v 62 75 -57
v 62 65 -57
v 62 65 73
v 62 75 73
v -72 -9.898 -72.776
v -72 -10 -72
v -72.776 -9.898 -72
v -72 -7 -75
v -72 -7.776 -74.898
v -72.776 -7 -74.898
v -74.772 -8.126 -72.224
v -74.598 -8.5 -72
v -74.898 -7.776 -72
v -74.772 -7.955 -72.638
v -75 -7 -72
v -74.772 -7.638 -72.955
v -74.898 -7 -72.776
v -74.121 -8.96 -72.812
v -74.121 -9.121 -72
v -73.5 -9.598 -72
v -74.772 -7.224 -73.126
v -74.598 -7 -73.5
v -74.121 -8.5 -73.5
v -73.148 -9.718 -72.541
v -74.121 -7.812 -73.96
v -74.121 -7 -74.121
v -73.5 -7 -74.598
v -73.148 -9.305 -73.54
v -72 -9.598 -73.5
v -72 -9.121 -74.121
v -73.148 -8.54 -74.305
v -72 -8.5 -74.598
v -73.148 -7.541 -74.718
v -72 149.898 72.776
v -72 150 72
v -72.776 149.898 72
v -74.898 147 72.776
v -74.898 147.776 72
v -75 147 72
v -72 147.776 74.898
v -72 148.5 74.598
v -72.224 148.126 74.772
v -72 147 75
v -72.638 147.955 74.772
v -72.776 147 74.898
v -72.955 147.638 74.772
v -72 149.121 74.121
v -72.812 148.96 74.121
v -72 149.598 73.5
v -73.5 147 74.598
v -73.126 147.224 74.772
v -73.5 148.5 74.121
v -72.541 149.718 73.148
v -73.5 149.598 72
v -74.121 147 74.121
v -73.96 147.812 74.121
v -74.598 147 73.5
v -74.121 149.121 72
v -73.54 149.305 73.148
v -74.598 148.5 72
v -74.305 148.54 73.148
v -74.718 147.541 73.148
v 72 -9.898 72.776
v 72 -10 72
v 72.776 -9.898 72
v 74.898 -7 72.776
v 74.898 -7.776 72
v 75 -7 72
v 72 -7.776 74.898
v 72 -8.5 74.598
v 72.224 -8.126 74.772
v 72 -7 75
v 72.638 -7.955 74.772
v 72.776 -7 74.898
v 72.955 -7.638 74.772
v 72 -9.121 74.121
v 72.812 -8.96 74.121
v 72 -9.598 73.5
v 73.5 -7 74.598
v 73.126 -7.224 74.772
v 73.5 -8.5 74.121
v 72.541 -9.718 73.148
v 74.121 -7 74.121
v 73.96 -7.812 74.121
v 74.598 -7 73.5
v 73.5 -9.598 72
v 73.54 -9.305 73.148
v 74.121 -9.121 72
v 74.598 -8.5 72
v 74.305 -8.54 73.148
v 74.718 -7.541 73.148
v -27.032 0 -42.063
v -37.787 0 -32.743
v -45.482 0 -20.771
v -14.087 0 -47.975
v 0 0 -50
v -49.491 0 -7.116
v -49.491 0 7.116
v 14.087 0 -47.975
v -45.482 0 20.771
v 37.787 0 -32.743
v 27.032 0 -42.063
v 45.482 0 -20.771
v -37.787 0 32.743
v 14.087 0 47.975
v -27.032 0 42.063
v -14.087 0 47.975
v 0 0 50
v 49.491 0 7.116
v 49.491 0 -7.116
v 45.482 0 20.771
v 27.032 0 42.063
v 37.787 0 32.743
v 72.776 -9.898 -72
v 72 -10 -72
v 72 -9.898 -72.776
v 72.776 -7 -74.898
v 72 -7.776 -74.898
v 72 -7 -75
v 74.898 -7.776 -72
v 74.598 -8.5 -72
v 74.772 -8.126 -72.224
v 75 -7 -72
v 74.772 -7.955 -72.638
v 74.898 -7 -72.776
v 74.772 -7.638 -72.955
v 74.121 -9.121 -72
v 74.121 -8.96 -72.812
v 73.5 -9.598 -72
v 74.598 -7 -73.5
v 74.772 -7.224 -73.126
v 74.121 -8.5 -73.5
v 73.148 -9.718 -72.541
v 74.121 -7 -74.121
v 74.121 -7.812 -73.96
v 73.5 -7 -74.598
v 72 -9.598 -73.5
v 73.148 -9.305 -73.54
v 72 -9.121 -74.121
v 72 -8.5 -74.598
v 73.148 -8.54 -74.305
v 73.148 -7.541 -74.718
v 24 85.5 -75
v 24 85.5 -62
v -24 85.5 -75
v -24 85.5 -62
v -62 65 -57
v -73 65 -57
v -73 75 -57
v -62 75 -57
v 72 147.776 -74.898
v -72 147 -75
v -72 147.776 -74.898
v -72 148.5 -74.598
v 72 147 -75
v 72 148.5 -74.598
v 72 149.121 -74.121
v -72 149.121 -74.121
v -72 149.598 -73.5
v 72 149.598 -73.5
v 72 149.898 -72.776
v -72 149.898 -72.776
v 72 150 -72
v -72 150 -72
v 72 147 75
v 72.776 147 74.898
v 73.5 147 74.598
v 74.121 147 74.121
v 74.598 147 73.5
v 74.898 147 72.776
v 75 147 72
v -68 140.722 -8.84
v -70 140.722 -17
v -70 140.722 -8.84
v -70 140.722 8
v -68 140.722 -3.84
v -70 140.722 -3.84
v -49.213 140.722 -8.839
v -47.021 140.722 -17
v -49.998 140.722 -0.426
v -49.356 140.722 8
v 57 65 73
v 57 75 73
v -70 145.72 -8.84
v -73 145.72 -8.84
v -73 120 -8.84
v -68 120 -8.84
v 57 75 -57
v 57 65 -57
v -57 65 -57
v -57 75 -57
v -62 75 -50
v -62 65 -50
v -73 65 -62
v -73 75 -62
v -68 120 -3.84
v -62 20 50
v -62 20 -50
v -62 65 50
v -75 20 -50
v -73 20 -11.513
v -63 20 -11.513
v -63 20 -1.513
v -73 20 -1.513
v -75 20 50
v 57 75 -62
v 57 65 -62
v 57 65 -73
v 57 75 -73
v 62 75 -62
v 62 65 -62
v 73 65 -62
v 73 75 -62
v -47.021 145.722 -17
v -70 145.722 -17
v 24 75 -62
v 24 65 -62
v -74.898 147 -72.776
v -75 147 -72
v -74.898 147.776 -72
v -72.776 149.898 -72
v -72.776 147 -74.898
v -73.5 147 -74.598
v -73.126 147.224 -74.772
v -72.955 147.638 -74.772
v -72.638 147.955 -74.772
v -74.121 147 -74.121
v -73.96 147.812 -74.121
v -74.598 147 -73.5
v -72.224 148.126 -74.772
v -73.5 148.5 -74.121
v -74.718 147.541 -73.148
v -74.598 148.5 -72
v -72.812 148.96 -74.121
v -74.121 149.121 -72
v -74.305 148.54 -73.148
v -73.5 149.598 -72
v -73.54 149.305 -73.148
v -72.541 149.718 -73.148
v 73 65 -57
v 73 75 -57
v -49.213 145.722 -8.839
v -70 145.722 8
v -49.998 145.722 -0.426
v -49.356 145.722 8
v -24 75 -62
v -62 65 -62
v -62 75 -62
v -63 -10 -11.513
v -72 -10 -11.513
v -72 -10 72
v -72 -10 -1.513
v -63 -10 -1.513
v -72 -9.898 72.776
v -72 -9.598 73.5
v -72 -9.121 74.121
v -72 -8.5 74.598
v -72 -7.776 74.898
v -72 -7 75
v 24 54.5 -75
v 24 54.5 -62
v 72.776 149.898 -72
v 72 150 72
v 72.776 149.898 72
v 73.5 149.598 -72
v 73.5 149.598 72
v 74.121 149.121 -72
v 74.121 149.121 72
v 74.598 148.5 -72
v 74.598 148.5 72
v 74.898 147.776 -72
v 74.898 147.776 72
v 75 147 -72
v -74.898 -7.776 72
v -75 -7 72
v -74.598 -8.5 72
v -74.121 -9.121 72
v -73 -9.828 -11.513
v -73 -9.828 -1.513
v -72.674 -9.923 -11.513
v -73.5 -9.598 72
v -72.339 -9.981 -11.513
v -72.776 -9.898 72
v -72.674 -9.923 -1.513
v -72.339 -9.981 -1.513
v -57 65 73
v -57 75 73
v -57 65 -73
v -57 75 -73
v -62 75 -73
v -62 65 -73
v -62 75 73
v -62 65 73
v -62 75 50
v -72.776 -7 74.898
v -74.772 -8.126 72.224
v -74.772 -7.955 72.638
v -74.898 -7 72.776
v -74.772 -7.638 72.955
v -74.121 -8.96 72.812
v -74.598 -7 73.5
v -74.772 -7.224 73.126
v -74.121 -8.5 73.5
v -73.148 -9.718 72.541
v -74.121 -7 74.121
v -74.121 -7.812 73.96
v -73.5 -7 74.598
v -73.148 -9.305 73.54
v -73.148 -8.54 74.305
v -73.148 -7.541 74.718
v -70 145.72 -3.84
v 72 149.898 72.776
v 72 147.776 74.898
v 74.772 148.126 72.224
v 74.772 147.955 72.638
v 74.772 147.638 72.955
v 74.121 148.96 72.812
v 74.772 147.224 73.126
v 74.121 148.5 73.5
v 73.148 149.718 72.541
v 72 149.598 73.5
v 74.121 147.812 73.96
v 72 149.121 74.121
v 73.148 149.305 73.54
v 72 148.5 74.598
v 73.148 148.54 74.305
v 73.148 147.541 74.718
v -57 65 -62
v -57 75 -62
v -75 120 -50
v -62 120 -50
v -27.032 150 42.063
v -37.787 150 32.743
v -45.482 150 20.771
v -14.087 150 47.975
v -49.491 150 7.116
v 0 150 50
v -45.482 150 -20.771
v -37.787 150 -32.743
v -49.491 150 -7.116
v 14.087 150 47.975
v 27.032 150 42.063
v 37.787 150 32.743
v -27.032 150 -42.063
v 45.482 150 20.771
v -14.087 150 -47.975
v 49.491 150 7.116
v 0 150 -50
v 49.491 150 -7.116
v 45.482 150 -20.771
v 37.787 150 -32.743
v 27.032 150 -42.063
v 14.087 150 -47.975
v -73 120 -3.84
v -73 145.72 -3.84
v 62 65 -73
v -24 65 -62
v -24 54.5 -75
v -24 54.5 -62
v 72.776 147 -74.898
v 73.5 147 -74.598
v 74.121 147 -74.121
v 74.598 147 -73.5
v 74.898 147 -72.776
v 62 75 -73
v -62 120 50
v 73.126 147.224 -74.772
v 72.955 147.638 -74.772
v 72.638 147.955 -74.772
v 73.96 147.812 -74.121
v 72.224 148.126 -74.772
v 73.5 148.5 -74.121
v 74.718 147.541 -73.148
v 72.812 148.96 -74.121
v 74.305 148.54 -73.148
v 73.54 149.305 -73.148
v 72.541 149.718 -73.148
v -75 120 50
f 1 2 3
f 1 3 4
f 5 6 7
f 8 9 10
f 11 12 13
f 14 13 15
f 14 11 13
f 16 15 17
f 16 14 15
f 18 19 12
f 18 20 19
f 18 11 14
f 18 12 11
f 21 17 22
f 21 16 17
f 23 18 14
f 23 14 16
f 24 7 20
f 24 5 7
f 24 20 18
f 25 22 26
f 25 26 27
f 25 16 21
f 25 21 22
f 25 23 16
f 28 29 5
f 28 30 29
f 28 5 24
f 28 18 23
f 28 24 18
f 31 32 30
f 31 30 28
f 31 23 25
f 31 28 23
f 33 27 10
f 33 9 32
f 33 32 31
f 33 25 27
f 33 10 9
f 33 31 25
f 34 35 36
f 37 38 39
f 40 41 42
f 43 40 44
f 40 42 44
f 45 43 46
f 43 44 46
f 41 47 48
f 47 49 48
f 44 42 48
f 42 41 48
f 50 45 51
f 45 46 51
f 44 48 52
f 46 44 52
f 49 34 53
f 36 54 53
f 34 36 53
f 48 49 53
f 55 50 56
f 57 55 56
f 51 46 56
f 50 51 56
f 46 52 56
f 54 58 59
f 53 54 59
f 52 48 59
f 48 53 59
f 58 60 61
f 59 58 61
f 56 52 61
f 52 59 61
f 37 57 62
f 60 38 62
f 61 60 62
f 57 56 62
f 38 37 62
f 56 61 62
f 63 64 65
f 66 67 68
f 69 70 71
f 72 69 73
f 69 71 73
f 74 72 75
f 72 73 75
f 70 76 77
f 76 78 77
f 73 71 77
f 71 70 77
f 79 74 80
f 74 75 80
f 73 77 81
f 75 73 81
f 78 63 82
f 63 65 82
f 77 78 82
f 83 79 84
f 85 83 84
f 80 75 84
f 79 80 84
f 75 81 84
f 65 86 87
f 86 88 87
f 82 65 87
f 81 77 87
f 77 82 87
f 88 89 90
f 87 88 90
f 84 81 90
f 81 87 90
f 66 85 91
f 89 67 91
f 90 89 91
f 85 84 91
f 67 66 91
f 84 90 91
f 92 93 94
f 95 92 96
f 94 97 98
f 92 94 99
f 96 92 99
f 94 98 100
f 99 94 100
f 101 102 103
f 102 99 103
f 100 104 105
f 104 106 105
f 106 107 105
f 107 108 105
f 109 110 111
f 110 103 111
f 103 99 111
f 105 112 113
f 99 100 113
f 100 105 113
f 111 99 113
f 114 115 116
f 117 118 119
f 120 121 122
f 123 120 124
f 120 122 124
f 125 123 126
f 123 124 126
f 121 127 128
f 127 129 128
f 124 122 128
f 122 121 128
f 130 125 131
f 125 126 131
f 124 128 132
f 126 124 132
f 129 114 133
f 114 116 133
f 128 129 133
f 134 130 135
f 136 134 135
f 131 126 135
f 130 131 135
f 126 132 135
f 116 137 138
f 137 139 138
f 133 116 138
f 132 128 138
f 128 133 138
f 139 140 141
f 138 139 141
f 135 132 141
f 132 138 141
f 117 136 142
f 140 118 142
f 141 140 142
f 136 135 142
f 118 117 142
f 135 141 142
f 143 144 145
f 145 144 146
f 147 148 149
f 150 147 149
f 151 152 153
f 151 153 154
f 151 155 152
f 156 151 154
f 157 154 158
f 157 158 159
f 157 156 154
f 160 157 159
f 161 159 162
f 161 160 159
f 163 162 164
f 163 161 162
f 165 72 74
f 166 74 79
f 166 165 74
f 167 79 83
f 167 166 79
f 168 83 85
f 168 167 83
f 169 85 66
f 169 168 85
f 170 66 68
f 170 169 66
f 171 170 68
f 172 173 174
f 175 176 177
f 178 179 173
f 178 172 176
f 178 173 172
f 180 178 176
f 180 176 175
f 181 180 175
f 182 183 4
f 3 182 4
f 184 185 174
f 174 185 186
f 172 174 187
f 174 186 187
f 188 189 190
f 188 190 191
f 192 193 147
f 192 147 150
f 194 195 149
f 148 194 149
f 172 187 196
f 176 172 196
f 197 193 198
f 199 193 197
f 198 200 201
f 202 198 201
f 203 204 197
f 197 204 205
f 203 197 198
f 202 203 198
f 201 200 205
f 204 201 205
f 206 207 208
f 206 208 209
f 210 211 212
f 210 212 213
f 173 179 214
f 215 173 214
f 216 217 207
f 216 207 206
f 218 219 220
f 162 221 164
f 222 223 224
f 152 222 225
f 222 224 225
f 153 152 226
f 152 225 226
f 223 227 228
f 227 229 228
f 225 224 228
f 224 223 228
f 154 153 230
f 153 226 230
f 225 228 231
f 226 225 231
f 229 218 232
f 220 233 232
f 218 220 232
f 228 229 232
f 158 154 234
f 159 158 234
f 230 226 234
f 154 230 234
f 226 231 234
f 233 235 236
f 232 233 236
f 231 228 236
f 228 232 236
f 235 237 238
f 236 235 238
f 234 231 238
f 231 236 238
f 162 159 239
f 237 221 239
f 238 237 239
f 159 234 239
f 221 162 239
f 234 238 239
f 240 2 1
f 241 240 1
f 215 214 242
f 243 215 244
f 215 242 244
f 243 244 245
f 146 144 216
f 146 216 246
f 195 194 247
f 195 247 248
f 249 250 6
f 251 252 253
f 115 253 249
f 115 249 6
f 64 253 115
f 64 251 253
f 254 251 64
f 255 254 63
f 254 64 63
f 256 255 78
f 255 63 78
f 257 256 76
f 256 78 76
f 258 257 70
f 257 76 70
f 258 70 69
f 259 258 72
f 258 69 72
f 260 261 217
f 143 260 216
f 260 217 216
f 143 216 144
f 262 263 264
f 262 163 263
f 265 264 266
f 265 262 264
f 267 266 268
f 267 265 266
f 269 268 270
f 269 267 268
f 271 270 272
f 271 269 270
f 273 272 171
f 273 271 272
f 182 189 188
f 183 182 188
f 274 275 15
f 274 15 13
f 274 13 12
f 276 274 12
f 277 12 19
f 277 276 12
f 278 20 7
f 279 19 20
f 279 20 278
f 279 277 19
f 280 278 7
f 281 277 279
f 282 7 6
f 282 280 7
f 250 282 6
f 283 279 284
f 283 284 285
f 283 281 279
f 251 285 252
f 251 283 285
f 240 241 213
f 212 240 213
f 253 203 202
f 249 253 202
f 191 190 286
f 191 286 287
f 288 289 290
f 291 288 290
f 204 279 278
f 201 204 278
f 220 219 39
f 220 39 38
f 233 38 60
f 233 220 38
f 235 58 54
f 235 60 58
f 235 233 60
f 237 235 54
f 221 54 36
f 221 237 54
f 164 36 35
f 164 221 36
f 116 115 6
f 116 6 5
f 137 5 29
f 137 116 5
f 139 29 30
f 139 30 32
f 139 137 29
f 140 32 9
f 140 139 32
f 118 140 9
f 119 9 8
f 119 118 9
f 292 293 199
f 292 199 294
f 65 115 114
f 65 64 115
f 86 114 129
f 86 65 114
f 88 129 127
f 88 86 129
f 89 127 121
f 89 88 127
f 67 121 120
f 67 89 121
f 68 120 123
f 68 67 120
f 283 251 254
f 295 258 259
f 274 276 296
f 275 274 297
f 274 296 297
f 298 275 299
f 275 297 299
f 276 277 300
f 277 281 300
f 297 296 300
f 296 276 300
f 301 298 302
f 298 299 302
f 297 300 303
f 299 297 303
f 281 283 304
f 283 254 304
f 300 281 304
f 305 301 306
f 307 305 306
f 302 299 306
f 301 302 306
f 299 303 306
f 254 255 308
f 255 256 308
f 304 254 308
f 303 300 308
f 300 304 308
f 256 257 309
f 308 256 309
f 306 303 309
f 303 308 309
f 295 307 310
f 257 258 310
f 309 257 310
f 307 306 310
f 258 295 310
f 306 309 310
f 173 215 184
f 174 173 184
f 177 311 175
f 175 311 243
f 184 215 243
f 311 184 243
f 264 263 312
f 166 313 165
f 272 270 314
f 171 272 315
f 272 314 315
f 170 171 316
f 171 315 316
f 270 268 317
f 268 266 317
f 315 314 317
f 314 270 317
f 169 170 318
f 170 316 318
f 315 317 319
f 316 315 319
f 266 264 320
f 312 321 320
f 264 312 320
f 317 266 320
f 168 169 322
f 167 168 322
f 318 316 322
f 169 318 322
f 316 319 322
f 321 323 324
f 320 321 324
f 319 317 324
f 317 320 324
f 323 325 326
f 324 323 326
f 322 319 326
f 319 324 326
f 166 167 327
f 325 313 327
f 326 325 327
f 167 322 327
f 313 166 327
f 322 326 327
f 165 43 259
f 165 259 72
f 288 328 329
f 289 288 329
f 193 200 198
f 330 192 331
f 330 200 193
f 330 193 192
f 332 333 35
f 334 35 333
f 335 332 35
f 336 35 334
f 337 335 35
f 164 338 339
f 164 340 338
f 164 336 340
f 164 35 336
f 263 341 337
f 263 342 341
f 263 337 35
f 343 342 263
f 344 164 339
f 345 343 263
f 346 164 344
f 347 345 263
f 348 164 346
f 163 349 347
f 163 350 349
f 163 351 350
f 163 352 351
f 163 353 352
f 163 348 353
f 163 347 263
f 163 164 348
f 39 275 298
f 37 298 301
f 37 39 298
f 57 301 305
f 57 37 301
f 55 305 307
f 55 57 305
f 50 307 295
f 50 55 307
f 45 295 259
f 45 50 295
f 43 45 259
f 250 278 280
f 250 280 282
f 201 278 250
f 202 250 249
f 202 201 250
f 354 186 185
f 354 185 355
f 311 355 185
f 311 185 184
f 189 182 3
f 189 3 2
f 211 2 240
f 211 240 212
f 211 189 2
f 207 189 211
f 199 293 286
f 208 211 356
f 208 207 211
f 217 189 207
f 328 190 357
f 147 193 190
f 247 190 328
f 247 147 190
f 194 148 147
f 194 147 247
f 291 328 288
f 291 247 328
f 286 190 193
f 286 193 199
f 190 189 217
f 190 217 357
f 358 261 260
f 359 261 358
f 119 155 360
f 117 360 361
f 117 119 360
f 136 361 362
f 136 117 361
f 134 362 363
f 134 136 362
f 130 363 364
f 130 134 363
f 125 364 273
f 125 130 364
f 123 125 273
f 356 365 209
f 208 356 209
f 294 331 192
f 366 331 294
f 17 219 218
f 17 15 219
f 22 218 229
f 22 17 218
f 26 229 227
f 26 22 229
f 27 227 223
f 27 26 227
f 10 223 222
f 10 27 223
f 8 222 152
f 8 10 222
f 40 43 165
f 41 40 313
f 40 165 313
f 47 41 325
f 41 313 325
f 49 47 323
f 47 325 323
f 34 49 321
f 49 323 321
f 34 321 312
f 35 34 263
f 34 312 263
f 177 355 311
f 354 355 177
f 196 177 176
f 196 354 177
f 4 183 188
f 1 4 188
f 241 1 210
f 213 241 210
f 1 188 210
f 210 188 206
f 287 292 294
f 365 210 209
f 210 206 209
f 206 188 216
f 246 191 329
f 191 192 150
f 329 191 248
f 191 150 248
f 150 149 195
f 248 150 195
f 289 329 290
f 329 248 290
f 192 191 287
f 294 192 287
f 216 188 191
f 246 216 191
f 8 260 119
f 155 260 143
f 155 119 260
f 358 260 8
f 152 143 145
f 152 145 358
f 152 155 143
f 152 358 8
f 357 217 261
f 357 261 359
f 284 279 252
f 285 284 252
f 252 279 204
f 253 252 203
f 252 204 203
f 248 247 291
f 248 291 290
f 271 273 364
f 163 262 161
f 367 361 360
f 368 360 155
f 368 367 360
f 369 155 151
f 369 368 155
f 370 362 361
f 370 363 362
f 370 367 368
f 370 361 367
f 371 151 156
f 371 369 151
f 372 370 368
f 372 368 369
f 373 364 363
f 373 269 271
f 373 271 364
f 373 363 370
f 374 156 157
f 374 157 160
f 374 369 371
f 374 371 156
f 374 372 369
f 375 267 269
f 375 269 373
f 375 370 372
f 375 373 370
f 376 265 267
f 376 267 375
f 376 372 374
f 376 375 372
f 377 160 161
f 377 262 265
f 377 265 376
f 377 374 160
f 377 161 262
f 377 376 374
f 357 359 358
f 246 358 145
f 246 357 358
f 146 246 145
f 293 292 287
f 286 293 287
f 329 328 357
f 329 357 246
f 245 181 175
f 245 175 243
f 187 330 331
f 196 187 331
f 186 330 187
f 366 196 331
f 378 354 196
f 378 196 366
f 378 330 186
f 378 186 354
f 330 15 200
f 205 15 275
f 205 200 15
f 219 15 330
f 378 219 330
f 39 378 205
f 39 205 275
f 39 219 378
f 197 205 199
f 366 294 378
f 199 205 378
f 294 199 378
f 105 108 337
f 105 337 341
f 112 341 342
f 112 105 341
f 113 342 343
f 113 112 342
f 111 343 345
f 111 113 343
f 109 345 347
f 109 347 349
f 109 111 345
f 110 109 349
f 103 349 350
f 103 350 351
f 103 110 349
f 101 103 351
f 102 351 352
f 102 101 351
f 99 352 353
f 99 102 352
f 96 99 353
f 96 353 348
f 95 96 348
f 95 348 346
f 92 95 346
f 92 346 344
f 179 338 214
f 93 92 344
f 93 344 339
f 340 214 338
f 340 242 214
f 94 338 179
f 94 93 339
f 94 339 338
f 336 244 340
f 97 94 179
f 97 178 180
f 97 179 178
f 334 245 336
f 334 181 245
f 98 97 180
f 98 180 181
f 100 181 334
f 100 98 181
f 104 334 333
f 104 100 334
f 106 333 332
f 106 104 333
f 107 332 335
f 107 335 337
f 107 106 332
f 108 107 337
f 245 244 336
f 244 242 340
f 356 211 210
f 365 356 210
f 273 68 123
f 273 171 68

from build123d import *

# Parameters (mm, degrees)
SKETCH6_W               = 150
SKETCH6_H               = 150
SKETCH6_R               = 50
BOSS_EXTRUDE4_DEPTH     = 150
SKETCH7_W               = 150
SKETCH7_H               = 150
BOSS_EXTRUDE5_DEPTH     = 10
SKETCH8_W               = 5
SKETCH8_H               = 10
CUT_EXTRUDE4_DEPTH      = 226
CUT_EXTRUDE5_DEPTH      = 226
CUT_EXTRUDE5_DEPTH_BACK = 226
SKETCH9_W               = 5
SKETCH9_H               = 10
CUT_EXTRUDE6_DEPTH      = 226
CUT_EXTRUDE6_DEPTH_BACK = 13
SKETCH10_W              = 48
SKETCH10_H              = 31
FILLET2_R               = 3
SKETCH18_W              = 100
SKETCH18_H              = 100
CUT_EXTRUDE10_DEPTH     = 13
SKETCH19_W              = 10
SKETCH19_H              = 10
CUT_EXTRUDE11_DEPTH     = 35
SKETCH21_W              = 5
SKETCH21_H              = 5
CUT_EXTRUDE12_DEPTH     = 25.72
SKETCH23_W              = 25
SKETCH23_H              = 5
CUT_EXTRUDE13_DEPTH     = 28
SKETCH24_W              = 5
SKETCH24_H              = 10
BOSS_EXTRUDE6_DEPTH     = 2
SKETCH27_W              = 5
SKETCH27_H              = 10
BOSS_EXTRUDE8_DEPTH     = 2
SKETCH31_W              = 5
SKETCH31_H              = 10
BOSS_EXTRUDE12_DEPTH    = 2
SKETCH32_W              = 5
SKETCH32_H              = 10
BOSS_EXTRUDE13_DEPTH    = 2


with BuildPart() as part:
    # Sketch6 → Boss-Extrude4 (new body)
    with BuildSketch(Plane(origin=(0, 0, 0), x_dir=(1, 0, 0), z_dir=(0, 1, 0))):
        Rectangle(SKETCH6_W, SKETCH6_H)
        with Locations(Location((0, 0, 0), (0, 0, 270))):
            Circle(SKETCH6_R, mode=Mode.SUBTRACT)
    extrude(amount=BOSS_EXTRUDE4_DEPTH)

    # Sketch7 → Boss-Extrude5 (add)
    with BuildSketch(Plane.XZ):
        Rectangle(SKETCH7_W, SKETCH7_H)
    extrude(amount=BOSS_EXTRUDE5_DEPTH)

    # Sketch8 → Cut-Extrude4 (cut, symmetric)
    with BuildSketch(Plane.XY.offset(75)):
        with Locations((59.5, 70)):
            Rectangle(SKETCH8_W, SKETCH8_H)
    cut_extrude4 = extrude(amount=CUT_EXTRUDE4_DEPTH, both=True, mode=Mode.SUBTRACT)

    # Mirror4: Cut-Extrude4 across plane
    add(cut_extrude4.mirror(Plane(origin=(0, 0, 0), x_dir=(0, 0, 1), z_dir=(1, 0, 0))), mode=Mode.SUBTRACT)

    # Sketch9 → Cut-Extrude5 (cut, two sides: drawn at the far end of the back side and taken through both)
    with BuildSketch(Plane(origin=(75, 0, 0), x_dir=(0, 0, -1), z_dir=(1, 0, 0)).offset(-CUT_EXTRUDE5_DEPTH_BACK)):
        with Locations((59.5, 70)):
            Rectangle(SKETCH9_W, SKETCH9_H)
    extrude(amount=CUT_EXTRUDE5_DEPTH + CUT_EXTRUDE5_DEPTH_BACK, mode=Mode.SUBTRACT)

    # Sketch10 → Cut-Extrude6 (cut, two sides: drawn at the far end of the back side and taken through both)
    with BuildSketch(Plane(origin=(0, 0, -75), x_dir=(-1, 0, 0), z_dir=(0, 0, -1)).offset(-CUT_EXTRUDE6_DEPTH_BACK)):
        with Locations((0, 70)):
            Rectangle(SKETCH10_W, SKETCH10_H)
    extrude(amount=CUT_EXTRUDE6_DEPTH + CUT_EXTRUDE6_DEPTH_BACK, mode=Mode.SUBTRACT)

    # Fillet2
    fillet2_edges = [part.edges().sort_by_distance(p)[0] for p in [
        (-75, 150, 0),
        (0, 150, 75),
        (0, -10, -75),
        (75, -10, 0),
        (0, -10, 75),
        (-75, -10, 0),
        (75, 150, 0),
        (75, 70, 75),
        (-75, 70, 75),
        (-75, 70, -75),
        (75, 70, -75),
        (0, 150, -75),
    ]]
    fillet(fillet2_edges, radius=FILLET2_R)

    # Sketch18 → Cut-Extrude10 (cut)
    with BuildSketch(Plane.ZY.offset(75)):
        with Locations((0, 70)):
            Rectangle(SKETCH18_W, SKETCH18_H)
    extrude(amount=-CUT_EXTRUDE10_DEPTH, mode=Mode.SUBTRACT)

    # Sketch19 → Cut-Extrude11 (cut)
    with BuildSketch(Plane(origin=(0, 20, 0), x_dir=(1, 0, 0), z_dir=(0, 1, 0))):
        with Locations((-68, 6.512866789)):
            Rectangle(SKETCH19_W, SKETCH19_H)
    extrude(amount=-CUT_EXTRUDE11_DEPTH, mode=Mode.SUBTRACT)

    # Sketch21 → Cut-Extrude12 (cut)
    with BuildSketch(Plane.XZ.offset(-120)):
        with Locations((-70.5, -6.339504826)):
            Rectangle(SKETCH21_W, SKETCH21_H)
    extrude(amount=-CUT_EXTRUDE12_DEPTH, mode=Mode.SUBTRACT)

    # Sketch23 → Cut-Extrude13 (cut)
    with BuildSketch(Plane.ZY.offset(42)):
        with Locations((-4.5, 143.222196011)):
            Rectangle(SKETCH23_W, SKETCH23_H)
    extrude(amount=CUT_EXTRUDE13_DEPTH, mode=Mode.SUBTRACT)

    # Sketch24 → Boss-Extrude6 (add)
    with BuildSketch(Plane.XY.offset(75)):
        with Locations((-59.5, 70)):
            Rectangle(SKETCH24_W, SKETCH24_H)
        with Locations((59.5, 70)):
            Rectangle(SKETCH24_W, SKETCH24_H)
    extrude(amount=-BOSS_EXTRUDE6_DEPTH)

    # Sketch27 → Boss-Extrude8 (add)
    with BuildSketch(Plane(origin=(0, 0, -75), x_dir=(-1, 0, 0), z_dir=(0, 0, -1))):
        with Locations((59.5, 70)):
            Rectangle(SKETCH27_W, SKETCH27_H)
        with Locations((-59.5, 70)):
            Rectangle(SKETCH27_W, SKETCH27_H)
    extrude(amount=-BOSS_EXTRUDE8_DEPTH)

    # Sketch31 → Boss-Extrude12 (add)
    with BuildSketch(Plane(origin=(75, 0, 0), x_dir=(0, 0, -1), z_dir=(1, 0, 0))):
        with Locations((59.5, 70)):
            Rectangle(SKETCH31_W, SKETCH31_H)
    extrude(amount=-BOSS_EXTRUDE12_DEPTH)

    # Sketch32 → Boss-Extrude13 (add)
    with BuildSketch(Plane.ZY.offset(75)):
        with Locations((-59.5, 70)):
            Rectangle(SKETCH32_W, SKETCH32_H)
    extrude(amount=-BOSS_EXTRUDE13_DEPTH)


solid = part.part
